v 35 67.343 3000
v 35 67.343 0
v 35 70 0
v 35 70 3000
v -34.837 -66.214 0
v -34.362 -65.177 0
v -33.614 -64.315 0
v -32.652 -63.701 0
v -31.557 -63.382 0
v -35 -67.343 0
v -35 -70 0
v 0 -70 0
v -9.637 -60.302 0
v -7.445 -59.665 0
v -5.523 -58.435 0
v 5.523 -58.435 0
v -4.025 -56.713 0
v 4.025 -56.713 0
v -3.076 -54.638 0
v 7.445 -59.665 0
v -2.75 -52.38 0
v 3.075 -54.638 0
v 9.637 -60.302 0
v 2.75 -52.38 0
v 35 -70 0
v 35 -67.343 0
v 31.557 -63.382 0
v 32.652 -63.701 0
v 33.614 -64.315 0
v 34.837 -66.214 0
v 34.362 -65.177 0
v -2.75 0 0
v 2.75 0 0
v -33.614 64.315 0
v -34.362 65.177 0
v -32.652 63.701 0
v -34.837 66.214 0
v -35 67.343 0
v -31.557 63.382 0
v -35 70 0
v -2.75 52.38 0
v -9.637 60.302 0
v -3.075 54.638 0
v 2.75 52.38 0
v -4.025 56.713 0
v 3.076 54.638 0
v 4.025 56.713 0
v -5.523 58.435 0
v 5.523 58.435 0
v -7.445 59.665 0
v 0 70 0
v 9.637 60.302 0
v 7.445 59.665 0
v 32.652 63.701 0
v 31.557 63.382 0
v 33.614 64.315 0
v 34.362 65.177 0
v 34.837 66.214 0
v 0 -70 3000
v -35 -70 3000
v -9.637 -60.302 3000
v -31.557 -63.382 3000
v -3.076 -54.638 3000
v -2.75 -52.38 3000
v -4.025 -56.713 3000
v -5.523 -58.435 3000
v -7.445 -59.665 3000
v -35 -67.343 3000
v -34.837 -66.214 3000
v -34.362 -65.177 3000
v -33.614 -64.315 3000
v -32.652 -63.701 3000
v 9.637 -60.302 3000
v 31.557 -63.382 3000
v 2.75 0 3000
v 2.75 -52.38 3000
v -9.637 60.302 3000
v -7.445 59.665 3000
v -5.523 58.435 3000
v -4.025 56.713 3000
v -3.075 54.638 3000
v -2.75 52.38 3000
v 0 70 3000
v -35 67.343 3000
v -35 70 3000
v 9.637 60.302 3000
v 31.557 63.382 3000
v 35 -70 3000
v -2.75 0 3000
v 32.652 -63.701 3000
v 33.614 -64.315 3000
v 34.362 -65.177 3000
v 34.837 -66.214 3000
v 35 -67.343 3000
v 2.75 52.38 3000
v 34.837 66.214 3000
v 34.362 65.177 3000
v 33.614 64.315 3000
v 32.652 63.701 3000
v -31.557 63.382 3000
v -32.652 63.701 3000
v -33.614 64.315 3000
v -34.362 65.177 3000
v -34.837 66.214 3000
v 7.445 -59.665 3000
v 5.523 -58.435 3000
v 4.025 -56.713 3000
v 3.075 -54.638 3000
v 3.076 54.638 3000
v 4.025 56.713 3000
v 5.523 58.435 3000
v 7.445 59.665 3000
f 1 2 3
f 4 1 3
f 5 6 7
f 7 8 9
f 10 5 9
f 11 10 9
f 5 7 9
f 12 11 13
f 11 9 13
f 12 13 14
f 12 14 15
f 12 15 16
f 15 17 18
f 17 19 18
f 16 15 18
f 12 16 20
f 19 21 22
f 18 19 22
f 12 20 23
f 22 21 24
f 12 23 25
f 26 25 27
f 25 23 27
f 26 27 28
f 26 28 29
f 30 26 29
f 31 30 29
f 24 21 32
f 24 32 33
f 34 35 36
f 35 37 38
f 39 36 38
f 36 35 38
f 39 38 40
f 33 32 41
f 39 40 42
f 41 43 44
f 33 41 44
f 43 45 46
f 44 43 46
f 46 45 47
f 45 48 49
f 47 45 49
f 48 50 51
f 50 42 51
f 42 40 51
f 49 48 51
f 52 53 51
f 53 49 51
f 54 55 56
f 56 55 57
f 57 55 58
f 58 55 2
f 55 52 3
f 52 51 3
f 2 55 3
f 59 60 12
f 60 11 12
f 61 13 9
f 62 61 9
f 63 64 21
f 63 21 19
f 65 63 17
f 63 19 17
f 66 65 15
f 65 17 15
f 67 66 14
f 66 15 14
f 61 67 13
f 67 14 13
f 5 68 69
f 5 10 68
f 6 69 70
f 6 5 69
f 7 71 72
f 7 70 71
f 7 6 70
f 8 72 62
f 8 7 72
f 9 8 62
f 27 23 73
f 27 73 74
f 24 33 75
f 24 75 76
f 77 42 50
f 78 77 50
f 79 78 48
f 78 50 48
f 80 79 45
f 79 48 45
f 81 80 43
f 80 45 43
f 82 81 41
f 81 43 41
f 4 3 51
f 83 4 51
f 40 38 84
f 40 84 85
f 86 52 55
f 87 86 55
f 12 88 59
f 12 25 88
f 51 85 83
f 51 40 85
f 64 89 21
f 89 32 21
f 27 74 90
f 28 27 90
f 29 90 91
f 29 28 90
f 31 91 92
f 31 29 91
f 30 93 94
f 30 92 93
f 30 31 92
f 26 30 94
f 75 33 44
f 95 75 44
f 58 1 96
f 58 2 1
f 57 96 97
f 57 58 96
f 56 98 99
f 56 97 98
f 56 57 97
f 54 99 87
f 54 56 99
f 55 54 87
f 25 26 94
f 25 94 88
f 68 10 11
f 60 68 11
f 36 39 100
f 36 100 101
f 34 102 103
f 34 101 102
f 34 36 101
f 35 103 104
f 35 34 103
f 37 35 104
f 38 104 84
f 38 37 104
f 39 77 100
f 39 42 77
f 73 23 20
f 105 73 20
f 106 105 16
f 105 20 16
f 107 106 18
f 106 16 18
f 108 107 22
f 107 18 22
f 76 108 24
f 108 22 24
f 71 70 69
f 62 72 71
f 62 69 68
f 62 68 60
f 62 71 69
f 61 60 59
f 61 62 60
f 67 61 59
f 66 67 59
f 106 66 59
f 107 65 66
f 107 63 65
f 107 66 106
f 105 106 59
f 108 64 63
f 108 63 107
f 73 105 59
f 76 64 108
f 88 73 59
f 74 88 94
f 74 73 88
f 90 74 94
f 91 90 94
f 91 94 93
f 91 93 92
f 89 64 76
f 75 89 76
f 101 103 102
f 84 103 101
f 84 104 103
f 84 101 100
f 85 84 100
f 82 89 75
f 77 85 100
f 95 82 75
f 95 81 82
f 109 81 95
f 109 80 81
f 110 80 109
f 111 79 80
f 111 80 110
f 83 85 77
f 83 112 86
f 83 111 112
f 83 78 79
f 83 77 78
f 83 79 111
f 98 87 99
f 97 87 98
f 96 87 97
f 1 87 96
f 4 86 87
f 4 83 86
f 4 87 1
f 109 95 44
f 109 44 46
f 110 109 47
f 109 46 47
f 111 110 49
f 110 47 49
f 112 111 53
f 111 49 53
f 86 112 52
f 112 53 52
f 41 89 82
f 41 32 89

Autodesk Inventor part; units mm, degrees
ref_plane "YZ Plane" through (0, 0, 0) normal (1, 0, 0) x (0, 1, 0)
ref_plane "Start plane" through (0, 0, 0) normal (0, 0, 1) x (1, 0, 0)
ref_plane "End plane" through (0, 0, 3000) normal (0, 0, 1) x (1, 0, 0)
sketch "Sketch" plane through (0, 0, 0) normal (0, 0, 1) x (1, 0, 0)
  line L0 (-2.75, 0) -> (-2.75, -52.3795)
  line L1 (-9.6366, -60.3016) -> (-31.5567, -63.3823)
  line L2 (-35, -67.3434) -> (-35, -70)
  line L3 (-35, -70) -> (0, -70)
  line L4 (-18.875, -70) -> (-18.875, -61.6) construction
  line L5 (-25.7112, 0) -> (34.2816, 0) construction
  line L6 (0, 40) -> (0, -70) construction
  line L7 (0, -48) -> (0, 64) construction
  line L8 (2.75, 0) -> (2.75, -52.3795)
  line L9 (9.6366, -60.3016) -> (31.5567, -63.3823)
  line L10 (35, -67.3434) -> (35, -70)
  line L11 (35, -70) -> (0, -70)
  line L12 (-2.75, 0) -> (2.75, 0) construction
  line L13 (-2.75, 0) -> (-2.75, 52.3795)
  line L14 (-9.6366, 60.3016) -> (-31.5567, 63.3823)
  line L15 (-35, 67.3434) -> (-35, 70)
  line L16 (-35, 70) -> (0, 70)
  line L17 (2.75, 0) -> (2.75, 52.3795)
  line L18 (9.6366, 60.3016) -> (31.5567, 63.3823)
  line L19 (35, 67.3434) -> (35, 70)
  line L20 (35, 70) -> (0, 70)
  arc A0 (-35, 67.3434) -> (-31.5567, 63.3823) centre (-31, 67.3434) ccw
  arc A1 (31.5567, 63.3823) -> (35, 67.3434) centre (31, 67.3434) ccw
  arc A2 (35, -67.3434) -> (31.5567, -63.3823) centre (31, -67.3434) ccw
  arc A3 (-31.5567, -63.3823) -> (-35, -67.3434) centre (-31, -67.3434) ccw
  arc A4 (-2.75, 52.3795) -> (-9.6366, 60.3016) centre (-10.75, 52.3795) ccw
  arc A5 (9.6366, 60.3016) -> (2.75, 52.3795) centre (10.75, 52.3795) ccw
  arc A6 (2.75, -52.3795) -> (9.6366, -60.3016) centre (10.75, -52.3795) ccw
  arc A7 (-9.6366, -60.3016) -> (-2.75, -52.3795) centre (-10.75, -52.3795) ccw
  line L21 (0, 86.4) -> (0, -70.4) construction
  line L22 (-37.7097, 0) -> (46.2801, 0) construction
  point P0 (-2.75, -59.3338)
  point P1 (-35, -63.8662)
  point P2 (2.75, -59.3338)
  point P3 (35, -63.8662)
  point P4 (18.875, -70)
  point P5 (18.875, -61.6)
  point P6 (-2.75, 59.3338)
  point P7 (-35, 63.8662)
  point P8 (-18.875, 70)
  point P9 (-18.875, 61.6)
  point P10 (2.75, 59.3338)
  point P11 (35, 63.8662)
  point P12 (18.875, 61.6)
  point P13 (18.875, 70)
  dimension "d1" = 2.2662
  dimension "d2" = 8.4
  dimension "d3" = 16.125
  dimension "d4" = 2.75
  dimension "d5" = 35
  dimension "d10" = 70
  dimension "d14" = 4
  dimension "d15" = 8
extrude "Body" add sketch "Sketch" along normal up to surface (3000 mm away) from surface at 0
sketch "Sketch3" plane through (0, 0, 0) normal (0, 0, 1) x (1, 0, 0)
  line L0 (0, 0) -> (10, 0)
ref_plane "Work Plane3" through (0, 0, 0) normal (0, -1, 0) x (1, 0, 0)
sketch "Sketch4" plane through (0, 0, 0) normal (0, -1, 0) x (1, 0, 0)
  line L0 (-2, 0) -> (12, 0) projected
  line L1 (-2, 3000) -> (12, 3000) projected
  dimension "d19" = 3000
equation "\"d2\" = G_T1"
equation "\"d3\" = G_C"
equation "\"d4\" = 0.5 * G_T"
equation "\"d5\" = 0.5 * G_W"
equation "\"d10\" = 0.5 * G_H"
equation "\"d14\" = G_ER"
equation "\"d15\" = G_IR"
equation "\"d6\" = G_L"
equation "\"G_T\" = 5.5"
equation "\"G_T1\" = 8.4"
equation "\"G_C\" = 16.125"
equation "\"G_NG\" = 0.140541"
equation "\"G_L\" = d19"
equation "\"G_ER\" = 0.5 * G_IR"
equation "\"G_IR\" = 8"
equation "\"G_OFFSET_START\" = 0"
equation "\"G_OFFSET_END\" = 0"
equation "\"G_W\" = 70"
equation "\"G_H\" = 140"
properties part number "ISO 657/15 - SB 140x15 - 3000" material "Steel, Mild"
